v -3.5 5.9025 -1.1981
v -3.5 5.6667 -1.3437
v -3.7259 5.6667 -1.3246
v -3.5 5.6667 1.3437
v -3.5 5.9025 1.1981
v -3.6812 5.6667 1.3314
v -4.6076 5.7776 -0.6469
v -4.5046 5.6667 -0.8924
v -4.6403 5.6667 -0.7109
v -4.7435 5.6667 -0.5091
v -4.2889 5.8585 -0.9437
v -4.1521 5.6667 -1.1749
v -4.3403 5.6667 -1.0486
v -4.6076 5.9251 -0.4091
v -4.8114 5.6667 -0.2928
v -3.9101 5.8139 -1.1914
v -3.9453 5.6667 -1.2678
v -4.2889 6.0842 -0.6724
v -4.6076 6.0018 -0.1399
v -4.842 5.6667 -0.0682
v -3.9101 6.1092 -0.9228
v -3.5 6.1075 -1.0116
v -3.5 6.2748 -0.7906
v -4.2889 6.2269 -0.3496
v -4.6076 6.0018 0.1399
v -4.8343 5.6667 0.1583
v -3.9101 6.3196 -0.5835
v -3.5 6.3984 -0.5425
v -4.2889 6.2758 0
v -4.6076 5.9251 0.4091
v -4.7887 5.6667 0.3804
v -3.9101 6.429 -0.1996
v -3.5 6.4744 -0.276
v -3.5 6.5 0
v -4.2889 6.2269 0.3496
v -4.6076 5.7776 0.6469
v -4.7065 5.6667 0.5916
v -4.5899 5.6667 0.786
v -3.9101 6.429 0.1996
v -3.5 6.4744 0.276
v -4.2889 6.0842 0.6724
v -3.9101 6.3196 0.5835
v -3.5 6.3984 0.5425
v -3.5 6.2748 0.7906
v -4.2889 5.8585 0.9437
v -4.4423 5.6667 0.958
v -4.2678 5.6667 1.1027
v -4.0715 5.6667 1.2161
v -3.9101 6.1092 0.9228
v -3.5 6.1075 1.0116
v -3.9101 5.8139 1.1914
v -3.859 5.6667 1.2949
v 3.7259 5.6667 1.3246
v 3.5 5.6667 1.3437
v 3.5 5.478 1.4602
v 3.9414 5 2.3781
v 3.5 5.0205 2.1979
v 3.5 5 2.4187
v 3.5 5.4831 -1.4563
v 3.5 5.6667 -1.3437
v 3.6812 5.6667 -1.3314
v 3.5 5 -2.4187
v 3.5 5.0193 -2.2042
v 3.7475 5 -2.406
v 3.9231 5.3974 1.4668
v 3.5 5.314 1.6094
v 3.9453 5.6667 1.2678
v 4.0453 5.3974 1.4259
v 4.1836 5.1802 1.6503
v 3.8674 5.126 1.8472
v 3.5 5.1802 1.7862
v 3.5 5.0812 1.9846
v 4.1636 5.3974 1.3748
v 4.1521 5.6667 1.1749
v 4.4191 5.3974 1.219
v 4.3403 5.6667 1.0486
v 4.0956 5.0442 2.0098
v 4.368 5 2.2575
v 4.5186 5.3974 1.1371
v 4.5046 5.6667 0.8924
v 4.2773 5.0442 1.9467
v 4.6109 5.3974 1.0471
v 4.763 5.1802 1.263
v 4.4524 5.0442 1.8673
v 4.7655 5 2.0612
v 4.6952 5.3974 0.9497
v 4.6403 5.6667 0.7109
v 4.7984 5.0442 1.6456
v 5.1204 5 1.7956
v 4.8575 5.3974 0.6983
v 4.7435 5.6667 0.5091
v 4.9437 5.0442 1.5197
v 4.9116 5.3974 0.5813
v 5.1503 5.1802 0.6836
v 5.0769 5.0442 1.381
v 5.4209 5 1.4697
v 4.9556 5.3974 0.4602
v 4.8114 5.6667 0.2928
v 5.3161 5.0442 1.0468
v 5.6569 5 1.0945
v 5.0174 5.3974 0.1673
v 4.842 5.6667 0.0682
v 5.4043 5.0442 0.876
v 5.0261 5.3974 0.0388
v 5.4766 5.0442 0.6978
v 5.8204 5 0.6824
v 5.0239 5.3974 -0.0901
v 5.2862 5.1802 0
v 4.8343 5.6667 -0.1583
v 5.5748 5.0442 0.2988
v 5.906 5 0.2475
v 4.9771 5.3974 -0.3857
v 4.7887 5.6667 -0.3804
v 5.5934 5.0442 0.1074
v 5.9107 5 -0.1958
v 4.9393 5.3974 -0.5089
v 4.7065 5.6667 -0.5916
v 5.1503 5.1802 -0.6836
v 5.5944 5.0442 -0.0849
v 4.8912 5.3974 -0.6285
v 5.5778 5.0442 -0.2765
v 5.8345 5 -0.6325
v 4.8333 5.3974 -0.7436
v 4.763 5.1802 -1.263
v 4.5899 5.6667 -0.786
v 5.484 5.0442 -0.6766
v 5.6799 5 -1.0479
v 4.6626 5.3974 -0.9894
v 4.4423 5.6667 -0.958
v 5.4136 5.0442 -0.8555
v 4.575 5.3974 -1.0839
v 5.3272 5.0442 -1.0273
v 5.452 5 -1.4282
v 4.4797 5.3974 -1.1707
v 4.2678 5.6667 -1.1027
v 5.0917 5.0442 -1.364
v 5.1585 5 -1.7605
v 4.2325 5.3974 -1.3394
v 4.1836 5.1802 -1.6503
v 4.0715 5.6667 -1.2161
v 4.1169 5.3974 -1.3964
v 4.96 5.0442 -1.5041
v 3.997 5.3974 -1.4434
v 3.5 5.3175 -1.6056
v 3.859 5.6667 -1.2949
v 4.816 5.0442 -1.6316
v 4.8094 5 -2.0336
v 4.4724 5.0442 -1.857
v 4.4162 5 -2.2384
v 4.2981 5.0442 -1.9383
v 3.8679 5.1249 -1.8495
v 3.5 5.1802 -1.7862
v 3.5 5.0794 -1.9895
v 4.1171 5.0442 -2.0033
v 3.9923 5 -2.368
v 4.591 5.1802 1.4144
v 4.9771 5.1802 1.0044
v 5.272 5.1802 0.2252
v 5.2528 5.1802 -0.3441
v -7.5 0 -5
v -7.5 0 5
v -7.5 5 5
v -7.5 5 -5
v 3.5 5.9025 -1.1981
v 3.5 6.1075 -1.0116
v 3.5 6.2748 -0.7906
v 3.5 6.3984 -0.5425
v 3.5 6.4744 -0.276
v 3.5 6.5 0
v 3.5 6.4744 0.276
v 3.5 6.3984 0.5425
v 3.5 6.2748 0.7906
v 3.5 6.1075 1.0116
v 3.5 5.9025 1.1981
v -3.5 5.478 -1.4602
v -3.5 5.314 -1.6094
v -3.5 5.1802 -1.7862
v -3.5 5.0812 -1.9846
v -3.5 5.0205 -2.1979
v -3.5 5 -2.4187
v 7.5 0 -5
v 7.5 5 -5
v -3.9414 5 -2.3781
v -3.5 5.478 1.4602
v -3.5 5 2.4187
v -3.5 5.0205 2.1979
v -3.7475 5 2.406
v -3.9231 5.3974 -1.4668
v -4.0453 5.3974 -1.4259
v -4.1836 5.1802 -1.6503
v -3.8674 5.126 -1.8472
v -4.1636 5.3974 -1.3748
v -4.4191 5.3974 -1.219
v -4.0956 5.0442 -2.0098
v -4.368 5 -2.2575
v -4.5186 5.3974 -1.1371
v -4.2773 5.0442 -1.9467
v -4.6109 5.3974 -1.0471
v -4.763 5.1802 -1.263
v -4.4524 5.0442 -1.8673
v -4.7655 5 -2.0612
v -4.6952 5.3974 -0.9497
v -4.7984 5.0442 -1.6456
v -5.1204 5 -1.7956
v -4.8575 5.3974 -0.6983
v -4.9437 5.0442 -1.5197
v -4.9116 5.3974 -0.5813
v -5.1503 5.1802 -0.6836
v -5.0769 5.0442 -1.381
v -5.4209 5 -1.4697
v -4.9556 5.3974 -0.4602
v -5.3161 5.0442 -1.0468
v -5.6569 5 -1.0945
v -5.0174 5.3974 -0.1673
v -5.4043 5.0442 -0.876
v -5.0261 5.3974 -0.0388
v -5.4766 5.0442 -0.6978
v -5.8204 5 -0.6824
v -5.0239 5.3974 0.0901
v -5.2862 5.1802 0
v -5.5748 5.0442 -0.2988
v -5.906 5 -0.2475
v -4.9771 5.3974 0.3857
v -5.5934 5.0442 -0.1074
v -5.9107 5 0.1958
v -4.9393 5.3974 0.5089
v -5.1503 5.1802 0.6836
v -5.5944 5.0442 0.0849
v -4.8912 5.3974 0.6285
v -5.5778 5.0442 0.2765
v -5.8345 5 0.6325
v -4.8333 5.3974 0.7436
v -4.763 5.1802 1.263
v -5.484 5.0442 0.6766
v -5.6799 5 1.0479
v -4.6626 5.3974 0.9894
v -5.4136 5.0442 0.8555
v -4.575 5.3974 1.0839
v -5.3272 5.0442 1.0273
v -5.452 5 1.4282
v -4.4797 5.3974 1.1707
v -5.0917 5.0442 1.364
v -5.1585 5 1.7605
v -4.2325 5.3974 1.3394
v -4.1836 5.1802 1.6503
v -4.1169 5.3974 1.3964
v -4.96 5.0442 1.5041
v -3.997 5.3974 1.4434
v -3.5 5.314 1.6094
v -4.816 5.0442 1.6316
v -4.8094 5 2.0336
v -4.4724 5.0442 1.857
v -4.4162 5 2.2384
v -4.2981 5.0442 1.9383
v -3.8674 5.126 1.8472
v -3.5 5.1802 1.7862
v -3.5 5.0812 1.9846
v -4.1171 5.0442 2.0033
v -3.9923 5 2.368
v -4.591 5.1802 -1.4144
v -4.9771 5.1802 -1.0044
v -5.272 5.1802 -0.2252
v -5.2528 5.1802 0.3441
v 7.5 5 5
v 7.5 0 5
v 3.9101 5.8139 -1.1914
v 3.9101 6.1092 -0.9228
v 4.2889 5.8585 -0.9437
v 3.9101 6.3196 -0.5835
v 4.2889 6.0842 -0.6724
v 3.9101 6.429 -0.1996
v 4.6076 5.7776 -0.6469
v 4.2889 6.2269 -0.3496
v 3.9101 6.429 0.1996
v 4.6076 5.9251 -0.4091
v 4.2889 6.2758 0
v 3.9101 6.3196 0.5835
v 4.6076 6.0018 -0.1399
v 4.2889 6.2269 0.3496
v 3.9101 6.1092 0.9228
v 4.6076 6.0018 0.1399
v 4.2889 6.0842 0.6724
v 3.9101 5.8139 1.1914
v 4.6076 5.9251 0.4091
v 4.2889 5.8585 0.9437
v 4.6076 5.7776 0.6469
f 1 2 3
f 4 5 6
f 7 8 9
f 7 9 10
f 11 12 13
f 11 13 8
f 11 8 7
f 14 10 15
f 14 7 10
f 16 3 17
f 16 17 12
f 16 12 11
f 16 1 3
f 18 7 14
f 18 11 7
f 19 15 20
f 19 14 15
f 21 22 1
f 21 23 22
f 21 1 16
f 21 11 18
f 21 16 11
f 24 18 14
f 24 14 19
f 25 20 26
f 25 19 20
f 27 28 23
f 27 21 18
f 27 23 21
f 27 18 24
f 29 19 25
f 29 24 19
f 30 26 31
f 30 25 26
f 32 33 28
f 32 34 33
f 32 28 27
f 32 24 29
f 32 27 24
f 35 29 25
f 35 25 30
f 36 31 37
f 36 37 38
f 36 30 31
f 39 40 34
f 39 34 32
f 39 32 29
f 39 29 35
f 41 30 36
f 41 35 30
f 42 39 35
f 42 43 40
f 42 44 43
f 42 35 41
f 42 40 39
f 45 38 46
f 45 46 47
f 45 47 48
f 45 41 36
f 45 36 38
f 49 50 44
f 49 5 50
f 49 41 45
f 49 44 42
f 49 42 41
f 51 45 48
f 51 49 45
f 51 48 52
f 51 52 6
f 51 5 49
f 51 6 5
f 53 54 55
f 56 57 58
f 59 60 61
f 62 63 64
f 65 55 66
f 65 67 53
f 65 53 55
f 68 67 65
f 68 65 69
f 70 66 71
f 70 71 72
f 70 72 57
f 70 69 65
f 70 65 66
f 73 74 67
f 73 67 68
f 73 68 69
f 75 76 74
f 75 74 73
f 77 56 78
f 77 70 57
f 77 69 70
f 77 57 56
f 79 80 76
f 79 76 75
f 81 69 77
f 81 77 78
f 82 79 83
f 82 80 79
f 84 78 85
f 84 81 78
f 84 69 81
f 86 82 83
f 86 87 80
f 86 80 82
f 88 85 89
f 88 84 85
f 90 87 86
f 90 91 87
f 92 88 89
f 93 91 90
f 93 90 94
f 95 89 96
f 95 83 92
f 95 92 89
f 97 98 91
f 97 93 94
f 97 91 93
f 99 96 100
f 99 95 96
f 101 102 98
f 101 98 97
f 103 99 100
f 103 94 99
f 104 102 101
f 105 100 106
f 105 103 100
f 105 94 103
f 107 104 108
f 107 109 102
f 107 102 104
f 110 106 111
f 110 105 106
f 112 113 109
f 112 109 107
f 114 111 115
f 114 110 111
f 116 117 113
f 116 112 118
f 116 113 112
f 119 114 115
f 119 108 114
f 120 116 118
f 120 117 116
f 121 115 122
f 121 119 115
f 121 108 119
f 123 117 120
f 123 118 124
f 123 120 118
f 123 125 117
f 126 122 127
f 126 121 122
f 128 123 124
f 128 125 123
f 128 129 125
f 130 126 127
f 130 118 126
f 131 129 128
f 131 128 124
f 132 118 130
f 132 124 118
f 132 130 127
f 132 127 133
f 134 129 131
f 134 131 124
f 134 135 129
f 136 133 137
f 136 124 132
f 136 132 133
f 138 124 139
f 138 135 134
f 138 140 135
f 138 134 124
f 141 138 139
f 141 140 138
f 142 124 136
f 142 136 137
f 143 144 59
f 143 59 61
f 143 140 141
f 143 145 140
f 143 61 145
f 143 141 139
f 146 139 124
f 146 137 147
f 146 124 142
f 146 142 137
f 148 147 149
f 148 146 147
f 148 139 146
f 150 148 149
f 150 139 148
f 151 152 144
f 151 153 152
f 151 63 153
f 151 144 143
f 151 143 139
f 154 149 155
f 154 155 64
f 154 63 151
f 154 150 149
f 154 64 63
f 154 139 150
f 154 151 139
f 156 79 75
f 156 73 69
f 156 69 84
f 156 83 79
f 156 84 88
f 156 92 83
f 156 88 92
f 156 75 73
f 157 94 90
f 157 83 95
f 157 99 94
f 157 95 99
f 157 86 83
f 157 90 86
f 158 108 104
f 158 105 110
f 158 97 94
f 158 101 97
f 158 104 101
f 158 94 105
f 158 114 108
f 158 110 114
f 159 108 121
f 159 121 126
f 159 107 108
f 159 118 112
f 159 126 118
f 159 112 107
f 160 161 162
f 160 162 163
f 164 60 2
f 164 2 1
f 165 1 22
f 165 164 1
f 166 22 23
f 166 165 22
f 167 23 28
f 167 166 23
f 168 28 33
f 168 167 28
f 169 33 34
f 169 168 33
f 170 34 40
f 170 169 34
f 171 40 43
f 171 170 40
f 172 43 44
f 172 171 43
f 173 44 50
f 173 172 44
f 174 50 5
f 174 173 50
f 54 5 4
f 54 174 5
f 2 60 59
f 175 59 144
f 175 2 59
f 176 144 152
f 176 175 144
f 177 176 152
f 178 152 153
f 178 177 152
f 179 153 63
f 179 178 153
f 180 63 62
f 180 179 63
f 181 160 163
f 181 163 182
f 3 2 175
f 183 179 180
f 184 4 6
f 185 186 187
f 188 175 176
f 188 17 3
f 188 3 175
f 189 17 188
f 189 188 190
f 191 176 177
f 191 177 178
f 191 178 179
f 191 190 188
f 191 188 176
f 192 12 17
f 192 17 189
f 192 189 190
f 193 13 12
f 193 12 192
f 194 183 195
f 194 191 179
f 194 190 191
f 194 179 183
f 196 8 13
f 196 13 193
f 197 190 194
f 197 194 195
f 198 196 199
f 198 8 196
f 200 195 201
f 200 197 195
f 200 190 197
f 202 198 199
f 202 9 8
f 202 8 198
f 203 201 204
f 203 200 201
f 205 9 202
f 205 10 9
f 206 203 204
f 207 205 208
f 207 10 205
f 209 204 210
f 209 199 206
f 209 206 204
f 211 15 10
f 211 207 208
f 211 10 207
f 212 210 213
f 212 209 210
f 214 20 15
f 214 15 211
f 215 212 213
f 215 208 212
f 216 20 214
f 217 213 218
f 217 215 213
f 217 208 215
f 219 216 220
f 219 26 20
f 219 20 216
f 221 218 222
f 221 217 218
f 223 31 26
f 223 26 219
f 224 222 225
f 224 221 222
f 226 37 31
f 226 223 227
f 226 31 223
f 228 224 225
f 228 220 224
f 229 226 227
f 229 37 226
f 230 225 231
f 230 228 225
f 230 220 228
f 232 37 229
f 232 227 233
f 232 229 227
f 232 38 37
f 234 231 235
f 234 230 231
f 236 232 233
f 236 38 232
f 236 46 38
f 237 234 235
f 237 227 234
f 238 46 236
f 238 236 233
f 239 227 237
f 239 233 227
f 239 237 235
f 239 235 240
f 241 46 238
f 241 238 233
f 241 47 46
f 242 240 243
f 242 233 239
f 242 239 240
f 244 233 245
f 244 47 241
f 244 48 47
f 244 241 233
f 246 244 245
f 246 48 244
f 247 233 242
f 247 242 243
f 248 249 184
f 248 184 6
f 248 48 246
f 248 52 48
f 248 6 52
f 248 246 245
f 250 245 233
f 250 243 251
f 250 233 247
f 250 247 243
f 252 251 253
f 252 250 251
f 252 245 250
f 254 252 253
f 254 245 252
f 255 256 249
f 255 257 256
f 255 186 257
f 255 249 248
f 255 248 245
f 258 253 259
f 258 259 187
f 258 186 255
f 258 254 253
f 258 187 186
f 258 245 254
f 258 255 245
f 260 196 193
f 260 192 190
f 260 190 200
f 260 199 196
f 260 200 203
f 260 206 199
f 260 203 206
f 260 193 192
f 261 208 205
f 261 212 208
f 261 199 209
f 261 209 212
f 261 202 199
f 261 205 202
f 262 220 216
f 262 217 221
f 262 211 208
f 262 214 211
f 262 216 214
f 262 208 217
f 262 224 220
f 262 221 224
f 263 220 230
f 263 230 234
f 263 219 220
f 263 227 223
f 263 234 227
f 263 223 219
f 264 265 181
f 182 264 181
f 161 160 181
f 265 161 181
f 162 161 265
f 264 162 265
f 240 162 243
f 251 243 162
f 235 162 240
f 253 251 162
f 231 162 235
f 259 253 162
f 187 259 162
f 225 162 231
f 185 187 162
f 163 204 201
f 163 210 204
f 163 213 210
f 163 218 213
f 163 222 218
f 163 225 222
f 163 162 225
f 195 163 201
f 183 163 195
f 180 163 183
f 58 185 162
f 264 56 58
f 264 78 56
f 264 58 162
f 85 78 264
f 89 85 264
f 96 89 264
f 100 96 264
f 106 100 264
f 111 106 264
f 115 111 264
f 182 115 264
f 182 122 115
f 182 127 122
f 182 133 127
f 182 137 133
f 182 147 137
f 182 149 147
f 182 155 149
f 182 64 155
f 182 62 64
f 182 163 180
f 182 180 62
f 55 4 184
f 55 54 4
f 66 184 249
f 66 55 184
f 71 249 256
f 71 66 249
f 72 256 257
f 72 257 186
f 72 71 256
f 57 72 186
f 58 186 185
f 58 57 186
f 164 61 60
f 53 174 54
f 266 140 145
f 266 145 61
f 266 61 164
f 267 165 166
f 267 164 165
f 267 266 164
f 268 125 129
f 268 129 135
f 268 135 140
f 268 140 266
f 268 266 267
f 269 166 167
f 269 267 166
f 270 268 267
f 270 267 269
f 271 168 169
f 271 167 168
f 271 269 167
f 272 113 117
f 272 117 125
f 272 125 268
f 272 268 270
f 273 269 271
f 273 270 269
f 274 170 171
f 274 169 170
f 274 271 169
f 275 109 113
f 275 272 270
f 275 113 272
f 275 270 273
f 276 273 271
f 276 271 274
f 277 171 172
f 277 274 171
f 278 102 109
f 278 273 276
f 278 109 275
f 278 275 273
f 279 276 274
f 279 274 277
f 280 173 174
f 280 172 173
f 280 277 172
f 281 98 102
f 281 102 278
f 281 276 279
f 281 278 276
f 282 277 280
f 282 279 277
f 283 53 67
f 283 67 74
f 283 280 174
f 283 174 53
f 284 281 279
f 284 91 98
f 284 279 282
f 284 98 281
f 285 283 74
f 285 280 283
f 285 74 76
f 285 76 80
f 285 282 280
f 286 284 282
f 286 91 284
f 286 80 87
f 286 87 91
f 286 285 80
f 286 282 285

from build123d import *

# Parameters (mm, degrees)
SKETCH_1_W      = 15
SKETCH_1_H      = 10
EXTRUDE_1_DEPTH = 5
FILLET_1_R      = 1.2


with BuildPart() as part:
    # 草图1 → 凸台-拉伸1 (new body)
    with BuildSketch(Plane(origin=(0, 0, 0), x_dir=(1, 0, 0), z_dir=(0, 1, 0))):
        Rectangle(SKETCH_1_W, SKETCH_1_H)
    extrude(amount=EXTRUDE_1_DEPTH)

    # 草图2 → 旋转1 (revolve)
    with BuildSketch(Plane.XY):
        with BuildLine():
            Line((-3.5, 6.5), (3.5, 6.5))
            ThreePointArc((3.5, 6.5), (4.560660172, 6.060660172), (5, 5))
            Line((5, 5), (-5, 5))
            ThreePointArc((-5, 5), (-4.560660172, 6.060660172), (-3.5, 6.5))
        make_face()
    revolve(axis=Axis((-7.5, 5, 0), (1, 0, 0)))

    # 圆角1
    fillet_1_edges = [part.edges().sort_by_distance(p)[0] for p in [
        (0, 5, 1.5),
        (4.560660172, 5, -1.060660172),
        (-4.560660172, 5, 1.060660172),
        (0, 5, -1.5),
    ]]
    fillet(fillet_1_edges, radius=FILLET_1_R)


solid = part.part
